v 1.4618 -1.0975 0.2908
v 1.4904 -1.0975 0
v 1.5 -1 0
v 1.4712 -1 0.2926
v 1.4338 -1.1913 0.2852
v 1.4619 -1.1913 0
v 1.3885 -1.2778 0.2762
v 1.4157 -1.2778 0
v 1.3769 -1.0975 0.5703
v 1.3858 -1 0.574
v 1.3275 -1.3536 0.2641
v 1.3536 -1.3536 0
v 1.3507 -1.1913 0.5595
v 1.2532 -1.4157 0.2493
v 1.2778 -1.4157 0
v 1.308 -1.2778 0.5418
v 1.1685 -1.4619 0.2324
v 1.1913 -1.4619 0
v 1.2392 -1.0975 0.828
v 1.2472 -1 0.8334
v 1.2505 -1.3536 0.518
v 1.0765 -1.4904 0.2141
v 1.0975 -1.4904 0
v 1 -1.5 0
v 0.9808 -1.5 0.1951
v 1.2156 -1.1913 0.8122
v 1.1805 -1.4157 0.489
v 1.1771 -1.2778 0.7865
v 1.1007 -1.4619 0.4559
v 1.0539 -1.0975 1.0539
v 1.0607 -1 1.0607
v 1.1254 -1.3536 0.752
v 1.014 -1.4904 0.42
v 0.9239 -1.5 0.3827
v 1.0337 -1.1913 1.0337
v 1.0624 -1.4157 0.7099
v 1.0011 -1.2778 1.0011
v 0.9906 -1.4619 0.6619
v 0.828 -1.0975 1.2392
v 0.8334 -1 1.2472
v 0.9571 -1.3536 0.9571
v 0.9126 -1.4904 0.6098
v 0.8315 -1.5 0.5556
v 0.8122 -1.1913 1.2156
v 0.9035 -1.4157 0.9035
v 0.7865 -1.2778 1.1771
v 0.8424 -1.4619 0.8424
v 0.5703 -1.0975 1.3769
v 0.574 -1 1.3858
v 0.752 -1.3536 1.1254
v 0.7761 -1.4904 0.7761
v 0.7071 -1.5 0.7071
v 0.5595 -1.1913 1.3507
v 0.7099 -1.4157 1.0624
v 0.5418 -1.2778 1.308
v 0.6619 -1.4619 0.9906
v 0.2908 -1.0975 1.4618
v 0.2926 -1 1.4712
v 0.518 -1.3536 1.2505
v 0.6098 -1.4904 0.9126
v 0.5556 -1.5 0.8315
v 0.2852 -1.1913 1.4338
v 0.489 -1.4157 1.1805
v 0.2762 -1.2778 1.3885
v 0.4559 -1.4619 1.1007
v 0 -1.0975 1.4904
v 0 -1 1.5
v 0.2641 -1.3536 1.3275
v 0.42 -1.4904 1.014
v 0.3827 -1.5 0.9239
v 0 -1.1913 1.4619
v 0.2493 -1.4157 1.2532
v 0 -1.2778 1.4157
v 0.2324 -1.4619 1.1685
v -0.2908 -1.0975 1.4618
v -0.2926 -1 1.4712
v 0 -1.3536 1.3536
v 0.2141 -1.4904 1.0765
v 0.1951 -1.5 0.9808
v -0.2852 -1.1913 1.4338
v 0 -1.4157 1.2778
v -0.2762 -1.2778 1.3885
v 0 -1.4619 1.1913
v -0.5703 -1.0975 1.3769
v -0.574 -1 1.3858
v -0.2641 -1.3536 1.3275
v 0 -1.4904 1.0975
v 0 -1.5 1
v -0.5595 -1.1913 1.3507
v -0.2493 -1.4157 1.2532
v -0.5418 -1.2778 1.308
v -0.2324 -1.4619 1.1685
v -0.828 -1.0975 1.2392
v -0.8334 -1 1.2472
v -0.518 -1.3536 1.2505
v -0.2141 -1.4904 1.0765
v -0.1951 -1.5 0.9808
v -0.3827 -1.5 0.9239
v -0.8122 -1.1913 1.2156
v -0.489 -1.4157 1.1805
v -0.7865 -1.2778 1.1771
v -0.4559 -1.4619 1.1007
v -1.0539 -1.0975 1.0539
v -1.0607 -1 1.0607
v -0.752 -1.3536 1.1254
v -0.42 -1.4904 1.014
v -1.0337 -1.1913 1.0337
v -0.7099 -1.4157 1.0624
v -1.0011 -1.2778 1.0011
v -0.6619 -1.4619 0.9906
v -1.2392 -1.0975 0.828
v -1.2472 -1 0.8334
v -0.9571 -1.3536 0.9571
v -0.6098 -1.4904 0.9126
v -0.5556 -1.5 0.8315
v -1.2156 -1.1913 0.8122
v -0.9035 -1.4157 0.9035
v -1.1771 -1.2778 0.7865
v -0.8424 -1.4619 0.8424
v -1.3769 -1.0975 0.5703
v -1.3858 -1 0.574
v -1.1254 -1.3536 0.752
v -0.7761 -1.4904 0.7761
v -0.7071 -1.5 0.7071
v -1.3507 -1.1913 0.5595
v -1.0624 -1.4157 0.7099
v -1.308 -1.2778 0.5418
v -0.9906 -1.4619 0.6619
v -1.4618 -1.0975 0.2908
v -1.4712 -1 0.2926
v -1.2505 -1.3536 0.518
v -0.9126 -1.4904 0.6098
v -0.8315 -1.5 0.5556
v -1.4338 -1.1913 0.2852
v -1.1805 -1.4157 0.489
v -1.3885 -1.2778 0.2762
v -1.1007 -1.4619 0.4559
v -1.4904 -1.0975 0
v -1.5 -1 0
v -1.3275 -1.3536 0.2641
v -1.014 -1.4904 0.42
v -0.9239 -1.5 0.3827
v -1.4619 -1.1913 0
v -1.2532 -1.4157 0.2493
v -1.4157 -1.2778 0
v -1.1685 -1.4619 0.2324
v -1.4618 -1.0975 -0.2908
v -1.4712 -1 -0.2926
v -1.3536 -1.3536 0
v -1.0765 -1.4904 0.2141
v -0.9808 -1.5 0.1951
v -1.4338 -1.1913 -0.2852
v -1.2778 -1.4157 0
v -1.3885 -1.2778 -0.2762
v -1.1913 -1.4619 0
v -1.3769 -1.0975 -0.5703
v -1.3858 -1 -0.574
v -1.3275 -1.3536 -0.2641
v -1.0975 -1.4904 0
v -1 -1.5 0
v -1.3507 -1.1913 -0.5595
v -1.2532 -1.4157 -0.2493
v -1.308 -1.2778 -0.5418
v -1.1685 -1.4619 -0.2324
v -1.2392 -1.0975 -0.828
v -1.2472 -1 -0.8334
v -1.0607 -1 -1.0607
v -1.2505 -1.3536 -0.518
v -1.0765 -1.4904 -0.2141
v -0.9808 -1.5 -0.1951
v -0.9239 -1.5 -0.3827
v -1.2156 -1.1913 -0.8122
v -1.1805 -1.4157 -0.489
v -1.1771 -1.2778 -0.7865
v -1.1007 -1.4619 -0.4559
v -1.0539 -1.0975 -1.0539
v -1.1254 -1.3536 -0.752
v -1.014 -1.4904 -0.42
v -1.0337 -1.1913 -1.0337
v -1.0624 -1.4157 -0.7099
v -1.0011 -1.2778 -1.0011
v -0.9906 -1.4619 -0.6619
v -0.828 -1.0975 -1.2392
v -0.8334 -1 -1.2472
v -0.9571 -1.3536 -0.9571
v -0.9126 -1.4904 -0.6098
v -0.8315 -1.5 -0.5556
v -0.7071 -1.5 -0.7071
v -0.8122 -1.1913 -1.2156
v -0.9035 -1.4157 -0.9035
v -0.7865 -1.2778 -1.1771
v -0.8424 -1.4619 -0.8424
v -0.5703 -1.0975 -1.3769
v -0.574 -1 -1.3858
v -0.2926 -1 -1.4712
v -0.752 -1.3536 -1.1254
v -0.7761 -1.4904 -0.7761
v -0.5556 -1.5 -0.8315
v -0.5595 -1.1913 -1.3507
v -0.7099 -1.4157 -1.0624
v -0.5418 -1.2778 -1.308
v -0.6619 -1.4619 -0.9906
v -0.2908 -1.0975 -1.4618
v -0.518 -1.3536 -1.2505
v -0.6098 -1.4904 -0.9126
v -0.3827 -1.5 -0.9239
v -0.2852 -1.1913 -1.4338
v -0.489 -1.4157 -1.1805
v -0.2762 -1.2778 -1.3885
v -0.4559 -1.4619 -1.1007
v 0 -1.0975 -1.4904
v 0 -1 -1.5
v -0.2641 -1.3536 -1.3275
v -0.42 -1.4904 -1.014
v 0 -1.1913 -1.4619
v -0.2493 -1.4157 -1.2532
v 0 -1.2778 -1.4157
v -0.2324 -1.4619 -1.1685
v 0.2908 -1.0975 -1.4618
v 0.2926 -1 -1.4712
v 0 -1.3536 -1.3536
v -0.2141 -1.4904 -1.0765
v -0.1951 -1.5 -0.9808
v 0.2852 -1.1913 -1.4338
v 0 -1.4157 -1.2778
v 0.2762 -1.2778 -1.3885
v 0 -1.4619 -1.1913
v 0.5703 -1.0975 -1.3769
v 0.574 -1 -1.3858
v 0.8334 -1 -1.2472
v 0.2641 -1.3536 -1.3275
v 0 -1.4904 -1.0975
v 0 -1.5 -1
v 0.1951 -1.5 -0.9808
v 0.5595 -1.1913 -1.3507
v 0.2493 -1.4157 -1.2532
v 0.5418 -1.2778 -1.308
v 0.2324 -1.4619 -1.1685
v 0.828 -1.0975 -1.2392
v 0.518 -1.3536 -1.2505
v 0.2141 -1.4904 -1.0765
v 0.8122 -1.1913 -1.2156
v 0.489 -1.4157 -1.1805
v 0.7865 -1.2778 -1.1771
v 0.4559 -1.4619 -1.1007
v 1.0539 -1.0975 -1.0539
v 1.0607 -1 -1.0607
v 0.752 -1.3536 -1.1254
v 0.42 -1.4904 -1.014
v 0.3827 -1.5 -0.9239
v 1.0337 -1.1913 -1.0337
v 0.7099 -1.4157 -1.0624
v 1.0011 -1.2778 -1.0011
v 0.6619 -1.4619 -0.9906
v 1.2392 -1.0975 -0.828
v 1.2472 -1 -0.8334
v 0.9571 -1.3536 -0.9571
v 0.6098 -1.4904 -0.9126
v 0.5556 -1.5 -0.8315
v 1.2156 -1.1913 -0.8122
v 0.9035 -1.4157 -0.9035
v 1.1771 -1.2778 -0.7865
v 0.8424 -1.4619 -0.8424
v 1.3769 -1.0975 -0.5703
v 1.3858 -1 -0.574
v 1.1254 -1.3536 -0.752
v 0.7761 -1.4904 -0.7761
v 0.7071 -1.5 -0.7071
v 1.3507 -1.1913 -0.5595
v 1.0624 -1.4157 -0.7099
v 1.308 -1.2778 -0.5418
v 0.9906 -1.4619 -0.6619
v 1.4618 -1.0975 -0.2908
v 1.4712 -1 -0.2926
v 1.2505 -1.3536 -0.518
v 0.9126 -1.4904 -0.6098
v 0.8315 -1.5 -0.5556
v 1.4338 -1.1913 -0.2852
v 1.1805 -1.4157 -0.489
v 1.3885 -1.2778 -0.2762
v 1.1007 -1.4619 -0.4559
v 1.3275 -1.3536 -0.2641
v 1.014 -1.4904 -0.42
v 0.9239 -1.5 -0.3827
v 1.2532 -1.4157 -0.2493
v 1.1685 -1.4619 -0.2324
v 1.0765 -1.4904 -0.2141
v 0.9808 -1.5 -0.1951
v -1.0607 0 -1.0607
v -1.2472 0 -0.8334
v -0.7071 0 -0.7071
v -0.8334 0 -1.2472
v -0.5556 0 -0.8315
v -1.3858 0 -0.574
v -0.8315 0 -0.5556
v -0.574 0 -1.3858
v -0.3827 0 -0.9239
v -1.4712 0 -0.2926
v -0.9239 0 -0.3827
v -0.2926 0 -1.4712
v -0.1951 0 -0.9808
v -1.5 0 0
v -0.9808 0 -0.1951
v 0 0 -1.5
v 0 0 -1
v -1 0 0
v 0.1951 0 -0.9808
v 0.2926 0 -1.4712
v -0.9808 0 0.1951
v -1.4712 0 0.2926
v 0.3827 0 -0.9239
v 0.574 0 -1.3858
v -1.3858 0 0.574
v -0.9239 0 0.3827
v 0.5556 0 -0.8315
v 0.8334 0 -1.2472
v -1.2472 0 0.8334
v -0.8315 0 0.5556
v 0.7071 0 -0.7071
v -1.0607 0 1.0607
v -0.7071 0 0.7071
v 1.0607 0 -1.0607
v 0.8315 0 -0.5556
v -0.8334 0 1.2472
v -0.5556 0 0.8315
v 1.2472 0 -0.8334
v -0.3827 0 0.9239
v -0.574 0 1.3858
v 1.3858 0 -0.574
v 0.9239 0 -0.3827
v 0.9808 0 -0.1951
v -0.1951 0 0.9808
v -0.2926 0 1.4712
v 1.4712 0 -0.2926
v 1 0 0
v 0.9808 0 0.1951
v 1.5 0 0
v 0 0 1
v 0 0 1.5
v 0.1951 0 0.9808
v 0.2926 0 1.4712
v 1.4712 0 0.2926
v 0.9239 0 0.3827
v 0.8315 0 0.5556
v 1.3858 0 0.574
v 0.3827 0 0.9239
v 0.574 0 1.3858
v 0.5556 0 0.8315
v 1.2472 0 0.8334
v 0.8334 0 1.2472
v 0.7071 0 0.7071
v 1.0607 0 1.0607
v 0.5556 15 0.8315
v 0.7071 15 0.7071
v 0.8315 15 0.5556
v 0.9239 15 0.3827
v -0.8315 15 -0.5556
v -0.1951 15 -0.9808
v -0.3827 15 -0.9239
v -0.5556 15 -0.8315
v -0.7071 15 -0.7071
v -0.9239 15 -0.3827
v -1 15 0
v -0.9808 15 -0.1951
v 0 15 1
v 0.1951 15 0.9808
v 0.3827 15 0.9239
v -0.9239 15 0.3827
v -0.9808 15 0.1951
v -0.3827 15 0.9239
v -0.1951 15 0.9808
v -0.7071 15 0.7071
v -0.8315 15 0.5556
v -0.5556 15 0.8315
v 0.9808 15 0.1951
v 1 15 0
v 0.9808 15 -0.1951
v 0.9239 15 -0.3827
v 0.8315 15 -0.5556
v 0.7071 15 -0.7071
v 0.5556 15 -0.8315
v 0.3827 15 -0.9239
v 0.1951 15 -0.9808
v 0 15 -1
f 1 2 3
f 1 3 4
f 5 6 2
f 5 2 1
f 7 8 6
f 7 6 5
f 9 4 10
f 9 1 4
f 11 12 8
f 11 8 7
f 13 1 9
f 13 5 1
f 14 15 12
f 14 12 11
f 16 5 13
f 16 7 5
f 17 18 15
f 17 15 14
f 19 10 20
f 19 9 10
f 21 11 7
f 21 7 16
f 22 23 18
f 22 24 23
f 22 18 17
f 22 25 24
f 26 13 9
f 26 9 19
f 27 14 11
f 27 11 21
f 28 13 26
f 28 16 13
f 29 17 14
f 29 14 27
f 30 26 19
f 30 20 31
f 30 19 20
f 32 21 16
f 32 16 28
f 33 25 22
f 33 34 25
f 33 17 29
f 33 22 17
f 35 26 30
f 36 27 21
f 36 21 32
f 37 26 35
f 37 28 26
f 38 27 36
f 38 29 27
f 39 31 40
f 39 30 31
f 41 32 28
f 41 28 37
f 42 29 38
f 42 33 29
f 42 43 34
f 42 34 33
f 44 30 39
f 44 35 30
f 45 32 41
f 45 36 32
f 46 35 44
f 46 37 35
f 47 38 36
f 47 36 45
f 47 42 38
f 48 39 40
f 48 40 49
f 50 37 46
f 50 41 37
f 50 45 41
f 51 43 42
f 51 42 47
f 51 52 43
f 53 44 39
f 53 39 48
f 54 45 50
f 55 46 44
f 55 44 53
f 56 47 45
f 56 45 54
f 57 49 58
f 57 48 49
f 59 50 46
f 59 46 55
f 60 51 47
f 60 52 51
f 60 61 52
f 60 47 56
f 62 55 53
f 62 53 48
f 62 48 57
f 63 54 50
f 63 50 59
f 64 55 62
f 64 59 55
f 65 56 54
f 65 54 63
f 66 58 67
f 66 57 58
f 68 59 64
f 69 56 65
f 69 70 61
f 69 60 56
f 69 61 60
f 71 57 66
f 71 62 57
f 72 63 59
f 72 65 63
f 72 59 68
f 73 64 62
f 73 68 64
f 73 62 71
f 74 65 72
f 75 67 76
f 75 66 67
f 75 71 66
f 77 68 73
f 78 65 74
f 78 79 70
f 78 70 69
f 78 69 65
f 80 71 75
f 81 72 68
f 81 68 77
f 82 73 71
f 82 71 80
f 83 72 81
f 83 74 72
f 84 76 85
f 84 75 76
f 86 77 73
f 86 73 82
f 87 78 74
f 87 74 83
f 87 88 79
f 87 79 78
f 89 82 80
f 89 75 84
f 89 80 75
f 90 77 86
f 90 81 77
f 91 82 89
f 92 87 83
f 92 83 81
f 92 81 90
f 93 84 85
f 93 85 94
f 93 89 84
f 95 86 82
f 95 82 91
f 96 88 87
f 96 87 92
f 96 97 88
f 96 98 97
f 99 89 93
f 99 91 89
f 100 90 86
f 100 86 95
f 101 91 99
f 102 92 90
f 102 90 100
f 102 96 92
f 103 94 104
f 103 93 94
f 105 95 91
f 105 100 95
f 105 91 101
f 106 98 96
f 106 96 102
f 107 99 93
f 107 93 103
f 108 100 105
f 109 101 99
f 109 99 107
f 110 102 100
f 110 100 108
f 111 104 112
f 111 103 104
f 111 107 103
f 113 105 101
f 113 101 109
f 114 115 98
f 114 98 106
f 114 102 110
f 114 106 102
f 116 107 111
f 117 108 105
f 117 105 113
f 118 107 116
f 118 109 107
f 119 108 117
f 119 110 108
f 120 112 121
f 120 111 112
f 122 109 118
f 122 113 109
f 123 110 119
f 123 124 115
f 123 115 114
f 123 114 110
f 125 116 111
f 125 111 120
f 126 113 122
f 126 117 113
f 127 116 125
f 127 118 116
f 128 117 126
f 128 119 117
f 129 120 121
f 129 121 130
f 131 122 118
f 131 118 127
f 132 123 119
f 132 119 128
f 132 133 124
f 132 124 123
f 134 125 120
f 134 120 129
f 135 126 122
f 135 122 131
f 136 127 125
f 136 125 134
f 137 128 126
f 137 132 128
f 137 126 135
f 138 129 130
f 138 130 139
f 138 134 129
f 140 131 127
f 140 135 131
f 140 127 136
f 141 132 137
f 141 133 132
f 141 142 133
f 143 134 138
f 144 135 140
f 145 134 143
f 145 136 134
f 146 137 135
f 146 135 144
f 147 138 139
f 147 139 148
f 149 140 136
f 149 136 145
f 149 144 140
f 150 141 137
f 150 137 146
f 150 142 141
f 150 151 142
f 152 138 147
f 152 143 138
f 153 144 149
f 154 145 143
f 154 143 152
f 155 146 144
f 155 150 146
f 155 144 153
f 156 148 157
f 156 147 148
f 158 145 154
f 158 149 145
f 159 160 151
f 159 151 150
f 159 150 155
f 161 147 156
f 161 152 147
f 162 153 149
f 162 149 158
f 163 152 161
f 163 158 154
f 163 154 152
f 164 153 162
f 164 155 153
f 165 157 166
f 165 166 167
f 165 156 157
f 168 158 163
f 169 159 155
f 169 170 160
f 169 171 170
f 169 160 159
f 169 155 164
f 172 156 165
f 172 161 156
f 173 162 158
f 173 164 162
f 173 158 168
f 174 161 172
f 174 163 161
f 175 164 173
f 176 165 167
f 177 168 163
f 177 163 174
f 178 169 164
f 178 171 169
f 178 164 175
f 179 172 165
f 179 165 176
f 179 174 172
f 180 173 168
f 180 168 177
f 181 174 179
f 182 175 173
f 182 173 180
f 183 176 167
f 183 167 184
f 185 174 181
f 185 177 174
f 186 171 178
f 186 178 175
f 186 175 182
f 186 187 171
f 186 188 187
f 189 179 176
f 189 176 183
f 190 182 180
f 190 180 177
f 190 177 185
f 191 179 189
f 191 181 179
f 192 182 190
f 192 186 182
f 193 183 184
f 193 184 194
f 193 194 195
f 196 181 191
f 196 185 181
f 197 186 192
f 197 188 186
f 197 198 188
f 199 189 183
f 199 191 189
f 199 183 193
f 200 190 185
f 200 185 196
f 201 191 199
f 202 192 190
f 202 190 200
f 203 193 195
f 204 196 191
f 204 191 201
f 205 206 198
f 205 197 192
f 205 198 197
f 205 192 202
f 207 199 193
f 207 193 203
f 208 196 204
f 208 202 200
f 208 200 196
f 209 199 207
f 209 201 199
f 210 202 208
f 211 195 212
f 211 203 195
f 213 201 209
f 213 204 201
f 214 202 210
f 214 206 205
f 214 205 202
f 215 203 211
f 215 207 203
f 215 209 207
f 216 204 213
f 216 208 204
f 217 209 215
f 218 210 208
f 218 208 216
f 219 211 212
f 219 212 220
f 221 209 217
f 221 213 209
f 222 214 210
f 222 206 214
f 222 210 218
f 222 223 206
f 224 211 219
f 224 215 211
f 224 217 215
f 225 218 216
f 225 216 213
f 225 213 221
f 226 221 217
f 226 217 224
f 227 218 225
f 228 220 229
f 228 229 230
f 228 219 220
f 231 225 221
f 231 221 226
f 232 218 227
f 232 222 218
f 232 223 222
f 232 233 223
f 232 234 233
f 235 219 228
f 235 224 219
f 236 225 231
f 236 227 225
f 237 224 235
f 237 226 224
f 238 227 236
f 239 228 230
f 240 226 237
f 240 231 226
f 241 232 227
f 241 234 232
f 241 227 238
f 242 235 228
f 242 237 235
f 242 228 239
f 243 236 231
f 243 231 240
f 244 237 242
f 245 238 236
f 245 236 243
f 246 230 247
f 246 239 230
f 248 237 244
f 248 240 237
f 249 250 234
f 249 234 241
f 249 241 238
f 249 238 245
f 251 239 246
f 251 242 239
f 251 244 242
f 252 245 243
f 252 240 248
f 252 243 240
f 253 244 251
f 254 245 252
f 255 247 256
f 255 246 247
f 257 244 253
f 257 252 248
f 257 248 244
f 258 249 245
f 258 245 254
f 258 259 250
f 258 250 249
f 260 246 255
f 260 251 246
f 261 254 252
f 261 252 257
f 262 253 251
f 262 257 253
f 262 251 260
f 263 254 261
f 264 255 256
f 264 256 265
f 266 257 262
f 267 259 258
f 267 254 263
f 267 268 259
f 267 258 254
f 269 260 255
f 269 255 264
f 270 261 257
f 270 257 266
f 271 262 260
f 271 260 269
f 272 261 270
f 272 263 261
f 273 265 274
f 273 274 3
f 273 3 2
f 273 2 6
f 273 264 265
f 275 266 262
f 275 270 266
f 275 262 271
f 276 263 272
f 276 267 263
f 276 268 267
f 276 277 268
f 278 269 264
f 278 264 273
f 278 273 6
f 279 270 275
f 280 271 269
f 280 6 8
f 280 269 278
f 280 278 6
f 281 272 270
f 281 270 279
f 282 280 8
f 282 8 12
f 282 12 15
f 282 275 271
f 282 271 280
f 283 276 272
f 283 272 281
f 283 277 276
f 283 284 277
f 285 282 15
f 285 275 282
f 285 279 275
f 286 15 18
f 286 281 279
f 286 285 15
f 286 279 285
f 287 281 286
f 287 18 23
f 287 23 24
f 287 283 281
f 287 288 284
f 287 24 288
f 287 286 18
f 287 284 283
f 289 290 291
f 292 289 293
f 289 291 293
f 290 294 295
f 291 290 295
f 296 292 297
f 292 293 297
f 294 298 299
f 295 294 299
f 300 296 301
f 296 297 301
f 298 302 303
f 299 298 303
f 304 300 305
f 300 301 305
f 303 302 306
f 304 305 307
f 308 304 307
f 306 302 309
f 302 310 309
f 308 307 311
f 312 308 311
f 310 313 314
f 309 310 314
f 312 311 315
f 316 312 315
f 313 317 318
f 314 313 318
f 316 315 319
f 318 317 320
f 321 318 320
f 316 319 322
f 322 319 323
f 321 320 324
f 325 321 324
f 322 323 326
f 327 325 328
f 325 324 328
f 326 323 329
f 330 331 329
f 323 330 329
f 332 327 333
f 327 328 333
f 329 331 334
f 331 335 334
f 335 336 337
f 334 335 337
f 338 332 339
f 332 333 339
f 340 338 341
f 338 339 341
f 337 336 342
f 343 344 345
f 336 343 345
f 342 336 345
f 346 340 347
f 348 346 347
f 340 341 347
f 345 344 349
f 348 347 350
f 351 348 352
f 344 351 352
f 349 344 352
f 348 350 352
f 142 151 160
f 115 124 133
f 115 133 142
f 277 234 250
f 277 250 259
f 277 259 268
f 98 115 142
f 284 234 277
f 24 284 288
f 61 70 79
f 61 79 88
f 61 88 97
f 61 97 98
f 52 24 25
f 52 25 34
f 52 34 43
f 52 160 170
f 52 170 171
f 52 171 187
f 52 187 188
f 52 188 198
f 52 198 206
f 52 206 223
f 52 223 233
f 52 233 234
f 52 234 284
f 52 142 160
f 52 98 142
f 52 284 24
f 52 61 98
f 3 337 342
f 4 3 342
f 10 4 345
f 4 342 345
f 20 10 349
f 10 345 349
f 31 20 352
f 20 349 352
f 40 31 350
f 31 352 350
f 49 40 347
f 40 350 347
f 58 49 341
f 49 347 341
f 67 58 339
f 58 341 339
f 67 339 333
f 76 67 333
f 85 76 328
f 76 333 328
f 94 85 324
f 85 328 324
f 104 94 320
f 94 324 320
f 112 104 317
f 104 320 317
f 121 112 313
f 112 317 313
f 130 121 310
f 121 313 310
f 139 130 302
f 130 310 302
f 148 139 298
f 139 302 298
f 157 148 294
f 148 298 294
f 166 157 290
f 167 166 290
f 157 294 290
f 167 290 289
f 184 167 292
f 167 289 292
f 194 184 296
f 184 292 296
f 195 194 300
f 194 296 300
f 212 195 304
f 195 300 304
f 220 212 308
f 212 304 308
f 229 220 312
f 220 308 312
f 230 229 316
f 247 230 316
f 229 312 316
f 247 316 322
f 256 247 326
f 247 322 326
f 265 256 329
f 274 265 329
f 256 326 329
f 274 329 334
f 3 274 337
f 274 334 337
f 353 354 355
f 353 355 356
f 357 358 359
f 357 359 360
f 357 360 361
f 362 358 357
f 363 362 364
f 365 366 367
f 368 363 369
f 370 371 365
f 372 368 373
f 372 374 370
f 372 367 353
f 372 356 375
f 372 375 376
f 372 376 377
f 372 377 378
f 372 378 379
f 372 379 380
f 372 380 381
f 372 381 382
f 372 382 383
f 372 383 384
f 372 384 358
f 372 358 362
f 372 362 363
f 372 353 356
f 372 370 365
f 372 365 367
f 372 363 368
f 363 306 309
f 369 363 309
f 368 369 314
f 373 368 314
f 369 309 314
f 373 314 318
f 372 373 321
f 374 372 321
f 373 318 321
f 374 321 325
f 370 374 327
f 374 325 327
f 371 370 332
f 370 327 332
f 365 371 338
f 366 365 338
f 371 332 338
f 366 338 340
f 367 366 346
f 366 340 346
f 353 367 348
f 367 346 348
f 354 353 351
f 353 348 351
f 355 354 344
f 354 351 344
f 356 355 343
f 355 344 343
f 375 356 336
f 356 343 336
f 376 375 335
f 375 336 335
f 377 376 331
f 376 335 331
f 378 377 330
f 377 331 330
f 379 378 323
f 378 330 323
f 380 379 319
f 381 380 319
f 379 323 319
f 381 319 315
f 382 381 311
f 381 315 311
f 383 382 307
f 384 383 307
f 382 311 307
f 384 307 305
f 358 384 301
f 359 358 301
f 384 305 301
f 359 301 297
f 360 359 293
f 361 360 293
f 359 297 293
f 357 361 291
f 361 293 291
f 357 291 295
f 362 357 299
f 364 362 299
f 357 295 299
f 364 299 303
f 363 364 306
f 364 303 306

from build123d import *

# Parameters (mm, degrees)
F0_R     = 1.5
F1_DEPTH = 1.5
F2_R     = 0.5
F3_R     = 1
F4_DEPTH = 15


with BuildPart() as f1:
    # F0 (on Front) → F1 (new body)
    with BuildSketch(Plane.XZ):
        Circle(F0_R)
    extrude(amount=F1_DEPTH)

    # F2
    f2_edges = [f1.edges().sort_by_distance(p)[0] for p in [
        (-1.5, -1.5, 0),
    ]]
    fillet(f2_edges, radius=F2_R)

    # F3 (on face) → F4 (join)
    with BuildSketch(Plane(origin=(0, 0, 0), x_dir=(-1, 0, 0), z_dir=(0, 1, 0))):
        Circle(F3_R)
    extrude(amount=F4_DEPTH)


solid = f1.part
